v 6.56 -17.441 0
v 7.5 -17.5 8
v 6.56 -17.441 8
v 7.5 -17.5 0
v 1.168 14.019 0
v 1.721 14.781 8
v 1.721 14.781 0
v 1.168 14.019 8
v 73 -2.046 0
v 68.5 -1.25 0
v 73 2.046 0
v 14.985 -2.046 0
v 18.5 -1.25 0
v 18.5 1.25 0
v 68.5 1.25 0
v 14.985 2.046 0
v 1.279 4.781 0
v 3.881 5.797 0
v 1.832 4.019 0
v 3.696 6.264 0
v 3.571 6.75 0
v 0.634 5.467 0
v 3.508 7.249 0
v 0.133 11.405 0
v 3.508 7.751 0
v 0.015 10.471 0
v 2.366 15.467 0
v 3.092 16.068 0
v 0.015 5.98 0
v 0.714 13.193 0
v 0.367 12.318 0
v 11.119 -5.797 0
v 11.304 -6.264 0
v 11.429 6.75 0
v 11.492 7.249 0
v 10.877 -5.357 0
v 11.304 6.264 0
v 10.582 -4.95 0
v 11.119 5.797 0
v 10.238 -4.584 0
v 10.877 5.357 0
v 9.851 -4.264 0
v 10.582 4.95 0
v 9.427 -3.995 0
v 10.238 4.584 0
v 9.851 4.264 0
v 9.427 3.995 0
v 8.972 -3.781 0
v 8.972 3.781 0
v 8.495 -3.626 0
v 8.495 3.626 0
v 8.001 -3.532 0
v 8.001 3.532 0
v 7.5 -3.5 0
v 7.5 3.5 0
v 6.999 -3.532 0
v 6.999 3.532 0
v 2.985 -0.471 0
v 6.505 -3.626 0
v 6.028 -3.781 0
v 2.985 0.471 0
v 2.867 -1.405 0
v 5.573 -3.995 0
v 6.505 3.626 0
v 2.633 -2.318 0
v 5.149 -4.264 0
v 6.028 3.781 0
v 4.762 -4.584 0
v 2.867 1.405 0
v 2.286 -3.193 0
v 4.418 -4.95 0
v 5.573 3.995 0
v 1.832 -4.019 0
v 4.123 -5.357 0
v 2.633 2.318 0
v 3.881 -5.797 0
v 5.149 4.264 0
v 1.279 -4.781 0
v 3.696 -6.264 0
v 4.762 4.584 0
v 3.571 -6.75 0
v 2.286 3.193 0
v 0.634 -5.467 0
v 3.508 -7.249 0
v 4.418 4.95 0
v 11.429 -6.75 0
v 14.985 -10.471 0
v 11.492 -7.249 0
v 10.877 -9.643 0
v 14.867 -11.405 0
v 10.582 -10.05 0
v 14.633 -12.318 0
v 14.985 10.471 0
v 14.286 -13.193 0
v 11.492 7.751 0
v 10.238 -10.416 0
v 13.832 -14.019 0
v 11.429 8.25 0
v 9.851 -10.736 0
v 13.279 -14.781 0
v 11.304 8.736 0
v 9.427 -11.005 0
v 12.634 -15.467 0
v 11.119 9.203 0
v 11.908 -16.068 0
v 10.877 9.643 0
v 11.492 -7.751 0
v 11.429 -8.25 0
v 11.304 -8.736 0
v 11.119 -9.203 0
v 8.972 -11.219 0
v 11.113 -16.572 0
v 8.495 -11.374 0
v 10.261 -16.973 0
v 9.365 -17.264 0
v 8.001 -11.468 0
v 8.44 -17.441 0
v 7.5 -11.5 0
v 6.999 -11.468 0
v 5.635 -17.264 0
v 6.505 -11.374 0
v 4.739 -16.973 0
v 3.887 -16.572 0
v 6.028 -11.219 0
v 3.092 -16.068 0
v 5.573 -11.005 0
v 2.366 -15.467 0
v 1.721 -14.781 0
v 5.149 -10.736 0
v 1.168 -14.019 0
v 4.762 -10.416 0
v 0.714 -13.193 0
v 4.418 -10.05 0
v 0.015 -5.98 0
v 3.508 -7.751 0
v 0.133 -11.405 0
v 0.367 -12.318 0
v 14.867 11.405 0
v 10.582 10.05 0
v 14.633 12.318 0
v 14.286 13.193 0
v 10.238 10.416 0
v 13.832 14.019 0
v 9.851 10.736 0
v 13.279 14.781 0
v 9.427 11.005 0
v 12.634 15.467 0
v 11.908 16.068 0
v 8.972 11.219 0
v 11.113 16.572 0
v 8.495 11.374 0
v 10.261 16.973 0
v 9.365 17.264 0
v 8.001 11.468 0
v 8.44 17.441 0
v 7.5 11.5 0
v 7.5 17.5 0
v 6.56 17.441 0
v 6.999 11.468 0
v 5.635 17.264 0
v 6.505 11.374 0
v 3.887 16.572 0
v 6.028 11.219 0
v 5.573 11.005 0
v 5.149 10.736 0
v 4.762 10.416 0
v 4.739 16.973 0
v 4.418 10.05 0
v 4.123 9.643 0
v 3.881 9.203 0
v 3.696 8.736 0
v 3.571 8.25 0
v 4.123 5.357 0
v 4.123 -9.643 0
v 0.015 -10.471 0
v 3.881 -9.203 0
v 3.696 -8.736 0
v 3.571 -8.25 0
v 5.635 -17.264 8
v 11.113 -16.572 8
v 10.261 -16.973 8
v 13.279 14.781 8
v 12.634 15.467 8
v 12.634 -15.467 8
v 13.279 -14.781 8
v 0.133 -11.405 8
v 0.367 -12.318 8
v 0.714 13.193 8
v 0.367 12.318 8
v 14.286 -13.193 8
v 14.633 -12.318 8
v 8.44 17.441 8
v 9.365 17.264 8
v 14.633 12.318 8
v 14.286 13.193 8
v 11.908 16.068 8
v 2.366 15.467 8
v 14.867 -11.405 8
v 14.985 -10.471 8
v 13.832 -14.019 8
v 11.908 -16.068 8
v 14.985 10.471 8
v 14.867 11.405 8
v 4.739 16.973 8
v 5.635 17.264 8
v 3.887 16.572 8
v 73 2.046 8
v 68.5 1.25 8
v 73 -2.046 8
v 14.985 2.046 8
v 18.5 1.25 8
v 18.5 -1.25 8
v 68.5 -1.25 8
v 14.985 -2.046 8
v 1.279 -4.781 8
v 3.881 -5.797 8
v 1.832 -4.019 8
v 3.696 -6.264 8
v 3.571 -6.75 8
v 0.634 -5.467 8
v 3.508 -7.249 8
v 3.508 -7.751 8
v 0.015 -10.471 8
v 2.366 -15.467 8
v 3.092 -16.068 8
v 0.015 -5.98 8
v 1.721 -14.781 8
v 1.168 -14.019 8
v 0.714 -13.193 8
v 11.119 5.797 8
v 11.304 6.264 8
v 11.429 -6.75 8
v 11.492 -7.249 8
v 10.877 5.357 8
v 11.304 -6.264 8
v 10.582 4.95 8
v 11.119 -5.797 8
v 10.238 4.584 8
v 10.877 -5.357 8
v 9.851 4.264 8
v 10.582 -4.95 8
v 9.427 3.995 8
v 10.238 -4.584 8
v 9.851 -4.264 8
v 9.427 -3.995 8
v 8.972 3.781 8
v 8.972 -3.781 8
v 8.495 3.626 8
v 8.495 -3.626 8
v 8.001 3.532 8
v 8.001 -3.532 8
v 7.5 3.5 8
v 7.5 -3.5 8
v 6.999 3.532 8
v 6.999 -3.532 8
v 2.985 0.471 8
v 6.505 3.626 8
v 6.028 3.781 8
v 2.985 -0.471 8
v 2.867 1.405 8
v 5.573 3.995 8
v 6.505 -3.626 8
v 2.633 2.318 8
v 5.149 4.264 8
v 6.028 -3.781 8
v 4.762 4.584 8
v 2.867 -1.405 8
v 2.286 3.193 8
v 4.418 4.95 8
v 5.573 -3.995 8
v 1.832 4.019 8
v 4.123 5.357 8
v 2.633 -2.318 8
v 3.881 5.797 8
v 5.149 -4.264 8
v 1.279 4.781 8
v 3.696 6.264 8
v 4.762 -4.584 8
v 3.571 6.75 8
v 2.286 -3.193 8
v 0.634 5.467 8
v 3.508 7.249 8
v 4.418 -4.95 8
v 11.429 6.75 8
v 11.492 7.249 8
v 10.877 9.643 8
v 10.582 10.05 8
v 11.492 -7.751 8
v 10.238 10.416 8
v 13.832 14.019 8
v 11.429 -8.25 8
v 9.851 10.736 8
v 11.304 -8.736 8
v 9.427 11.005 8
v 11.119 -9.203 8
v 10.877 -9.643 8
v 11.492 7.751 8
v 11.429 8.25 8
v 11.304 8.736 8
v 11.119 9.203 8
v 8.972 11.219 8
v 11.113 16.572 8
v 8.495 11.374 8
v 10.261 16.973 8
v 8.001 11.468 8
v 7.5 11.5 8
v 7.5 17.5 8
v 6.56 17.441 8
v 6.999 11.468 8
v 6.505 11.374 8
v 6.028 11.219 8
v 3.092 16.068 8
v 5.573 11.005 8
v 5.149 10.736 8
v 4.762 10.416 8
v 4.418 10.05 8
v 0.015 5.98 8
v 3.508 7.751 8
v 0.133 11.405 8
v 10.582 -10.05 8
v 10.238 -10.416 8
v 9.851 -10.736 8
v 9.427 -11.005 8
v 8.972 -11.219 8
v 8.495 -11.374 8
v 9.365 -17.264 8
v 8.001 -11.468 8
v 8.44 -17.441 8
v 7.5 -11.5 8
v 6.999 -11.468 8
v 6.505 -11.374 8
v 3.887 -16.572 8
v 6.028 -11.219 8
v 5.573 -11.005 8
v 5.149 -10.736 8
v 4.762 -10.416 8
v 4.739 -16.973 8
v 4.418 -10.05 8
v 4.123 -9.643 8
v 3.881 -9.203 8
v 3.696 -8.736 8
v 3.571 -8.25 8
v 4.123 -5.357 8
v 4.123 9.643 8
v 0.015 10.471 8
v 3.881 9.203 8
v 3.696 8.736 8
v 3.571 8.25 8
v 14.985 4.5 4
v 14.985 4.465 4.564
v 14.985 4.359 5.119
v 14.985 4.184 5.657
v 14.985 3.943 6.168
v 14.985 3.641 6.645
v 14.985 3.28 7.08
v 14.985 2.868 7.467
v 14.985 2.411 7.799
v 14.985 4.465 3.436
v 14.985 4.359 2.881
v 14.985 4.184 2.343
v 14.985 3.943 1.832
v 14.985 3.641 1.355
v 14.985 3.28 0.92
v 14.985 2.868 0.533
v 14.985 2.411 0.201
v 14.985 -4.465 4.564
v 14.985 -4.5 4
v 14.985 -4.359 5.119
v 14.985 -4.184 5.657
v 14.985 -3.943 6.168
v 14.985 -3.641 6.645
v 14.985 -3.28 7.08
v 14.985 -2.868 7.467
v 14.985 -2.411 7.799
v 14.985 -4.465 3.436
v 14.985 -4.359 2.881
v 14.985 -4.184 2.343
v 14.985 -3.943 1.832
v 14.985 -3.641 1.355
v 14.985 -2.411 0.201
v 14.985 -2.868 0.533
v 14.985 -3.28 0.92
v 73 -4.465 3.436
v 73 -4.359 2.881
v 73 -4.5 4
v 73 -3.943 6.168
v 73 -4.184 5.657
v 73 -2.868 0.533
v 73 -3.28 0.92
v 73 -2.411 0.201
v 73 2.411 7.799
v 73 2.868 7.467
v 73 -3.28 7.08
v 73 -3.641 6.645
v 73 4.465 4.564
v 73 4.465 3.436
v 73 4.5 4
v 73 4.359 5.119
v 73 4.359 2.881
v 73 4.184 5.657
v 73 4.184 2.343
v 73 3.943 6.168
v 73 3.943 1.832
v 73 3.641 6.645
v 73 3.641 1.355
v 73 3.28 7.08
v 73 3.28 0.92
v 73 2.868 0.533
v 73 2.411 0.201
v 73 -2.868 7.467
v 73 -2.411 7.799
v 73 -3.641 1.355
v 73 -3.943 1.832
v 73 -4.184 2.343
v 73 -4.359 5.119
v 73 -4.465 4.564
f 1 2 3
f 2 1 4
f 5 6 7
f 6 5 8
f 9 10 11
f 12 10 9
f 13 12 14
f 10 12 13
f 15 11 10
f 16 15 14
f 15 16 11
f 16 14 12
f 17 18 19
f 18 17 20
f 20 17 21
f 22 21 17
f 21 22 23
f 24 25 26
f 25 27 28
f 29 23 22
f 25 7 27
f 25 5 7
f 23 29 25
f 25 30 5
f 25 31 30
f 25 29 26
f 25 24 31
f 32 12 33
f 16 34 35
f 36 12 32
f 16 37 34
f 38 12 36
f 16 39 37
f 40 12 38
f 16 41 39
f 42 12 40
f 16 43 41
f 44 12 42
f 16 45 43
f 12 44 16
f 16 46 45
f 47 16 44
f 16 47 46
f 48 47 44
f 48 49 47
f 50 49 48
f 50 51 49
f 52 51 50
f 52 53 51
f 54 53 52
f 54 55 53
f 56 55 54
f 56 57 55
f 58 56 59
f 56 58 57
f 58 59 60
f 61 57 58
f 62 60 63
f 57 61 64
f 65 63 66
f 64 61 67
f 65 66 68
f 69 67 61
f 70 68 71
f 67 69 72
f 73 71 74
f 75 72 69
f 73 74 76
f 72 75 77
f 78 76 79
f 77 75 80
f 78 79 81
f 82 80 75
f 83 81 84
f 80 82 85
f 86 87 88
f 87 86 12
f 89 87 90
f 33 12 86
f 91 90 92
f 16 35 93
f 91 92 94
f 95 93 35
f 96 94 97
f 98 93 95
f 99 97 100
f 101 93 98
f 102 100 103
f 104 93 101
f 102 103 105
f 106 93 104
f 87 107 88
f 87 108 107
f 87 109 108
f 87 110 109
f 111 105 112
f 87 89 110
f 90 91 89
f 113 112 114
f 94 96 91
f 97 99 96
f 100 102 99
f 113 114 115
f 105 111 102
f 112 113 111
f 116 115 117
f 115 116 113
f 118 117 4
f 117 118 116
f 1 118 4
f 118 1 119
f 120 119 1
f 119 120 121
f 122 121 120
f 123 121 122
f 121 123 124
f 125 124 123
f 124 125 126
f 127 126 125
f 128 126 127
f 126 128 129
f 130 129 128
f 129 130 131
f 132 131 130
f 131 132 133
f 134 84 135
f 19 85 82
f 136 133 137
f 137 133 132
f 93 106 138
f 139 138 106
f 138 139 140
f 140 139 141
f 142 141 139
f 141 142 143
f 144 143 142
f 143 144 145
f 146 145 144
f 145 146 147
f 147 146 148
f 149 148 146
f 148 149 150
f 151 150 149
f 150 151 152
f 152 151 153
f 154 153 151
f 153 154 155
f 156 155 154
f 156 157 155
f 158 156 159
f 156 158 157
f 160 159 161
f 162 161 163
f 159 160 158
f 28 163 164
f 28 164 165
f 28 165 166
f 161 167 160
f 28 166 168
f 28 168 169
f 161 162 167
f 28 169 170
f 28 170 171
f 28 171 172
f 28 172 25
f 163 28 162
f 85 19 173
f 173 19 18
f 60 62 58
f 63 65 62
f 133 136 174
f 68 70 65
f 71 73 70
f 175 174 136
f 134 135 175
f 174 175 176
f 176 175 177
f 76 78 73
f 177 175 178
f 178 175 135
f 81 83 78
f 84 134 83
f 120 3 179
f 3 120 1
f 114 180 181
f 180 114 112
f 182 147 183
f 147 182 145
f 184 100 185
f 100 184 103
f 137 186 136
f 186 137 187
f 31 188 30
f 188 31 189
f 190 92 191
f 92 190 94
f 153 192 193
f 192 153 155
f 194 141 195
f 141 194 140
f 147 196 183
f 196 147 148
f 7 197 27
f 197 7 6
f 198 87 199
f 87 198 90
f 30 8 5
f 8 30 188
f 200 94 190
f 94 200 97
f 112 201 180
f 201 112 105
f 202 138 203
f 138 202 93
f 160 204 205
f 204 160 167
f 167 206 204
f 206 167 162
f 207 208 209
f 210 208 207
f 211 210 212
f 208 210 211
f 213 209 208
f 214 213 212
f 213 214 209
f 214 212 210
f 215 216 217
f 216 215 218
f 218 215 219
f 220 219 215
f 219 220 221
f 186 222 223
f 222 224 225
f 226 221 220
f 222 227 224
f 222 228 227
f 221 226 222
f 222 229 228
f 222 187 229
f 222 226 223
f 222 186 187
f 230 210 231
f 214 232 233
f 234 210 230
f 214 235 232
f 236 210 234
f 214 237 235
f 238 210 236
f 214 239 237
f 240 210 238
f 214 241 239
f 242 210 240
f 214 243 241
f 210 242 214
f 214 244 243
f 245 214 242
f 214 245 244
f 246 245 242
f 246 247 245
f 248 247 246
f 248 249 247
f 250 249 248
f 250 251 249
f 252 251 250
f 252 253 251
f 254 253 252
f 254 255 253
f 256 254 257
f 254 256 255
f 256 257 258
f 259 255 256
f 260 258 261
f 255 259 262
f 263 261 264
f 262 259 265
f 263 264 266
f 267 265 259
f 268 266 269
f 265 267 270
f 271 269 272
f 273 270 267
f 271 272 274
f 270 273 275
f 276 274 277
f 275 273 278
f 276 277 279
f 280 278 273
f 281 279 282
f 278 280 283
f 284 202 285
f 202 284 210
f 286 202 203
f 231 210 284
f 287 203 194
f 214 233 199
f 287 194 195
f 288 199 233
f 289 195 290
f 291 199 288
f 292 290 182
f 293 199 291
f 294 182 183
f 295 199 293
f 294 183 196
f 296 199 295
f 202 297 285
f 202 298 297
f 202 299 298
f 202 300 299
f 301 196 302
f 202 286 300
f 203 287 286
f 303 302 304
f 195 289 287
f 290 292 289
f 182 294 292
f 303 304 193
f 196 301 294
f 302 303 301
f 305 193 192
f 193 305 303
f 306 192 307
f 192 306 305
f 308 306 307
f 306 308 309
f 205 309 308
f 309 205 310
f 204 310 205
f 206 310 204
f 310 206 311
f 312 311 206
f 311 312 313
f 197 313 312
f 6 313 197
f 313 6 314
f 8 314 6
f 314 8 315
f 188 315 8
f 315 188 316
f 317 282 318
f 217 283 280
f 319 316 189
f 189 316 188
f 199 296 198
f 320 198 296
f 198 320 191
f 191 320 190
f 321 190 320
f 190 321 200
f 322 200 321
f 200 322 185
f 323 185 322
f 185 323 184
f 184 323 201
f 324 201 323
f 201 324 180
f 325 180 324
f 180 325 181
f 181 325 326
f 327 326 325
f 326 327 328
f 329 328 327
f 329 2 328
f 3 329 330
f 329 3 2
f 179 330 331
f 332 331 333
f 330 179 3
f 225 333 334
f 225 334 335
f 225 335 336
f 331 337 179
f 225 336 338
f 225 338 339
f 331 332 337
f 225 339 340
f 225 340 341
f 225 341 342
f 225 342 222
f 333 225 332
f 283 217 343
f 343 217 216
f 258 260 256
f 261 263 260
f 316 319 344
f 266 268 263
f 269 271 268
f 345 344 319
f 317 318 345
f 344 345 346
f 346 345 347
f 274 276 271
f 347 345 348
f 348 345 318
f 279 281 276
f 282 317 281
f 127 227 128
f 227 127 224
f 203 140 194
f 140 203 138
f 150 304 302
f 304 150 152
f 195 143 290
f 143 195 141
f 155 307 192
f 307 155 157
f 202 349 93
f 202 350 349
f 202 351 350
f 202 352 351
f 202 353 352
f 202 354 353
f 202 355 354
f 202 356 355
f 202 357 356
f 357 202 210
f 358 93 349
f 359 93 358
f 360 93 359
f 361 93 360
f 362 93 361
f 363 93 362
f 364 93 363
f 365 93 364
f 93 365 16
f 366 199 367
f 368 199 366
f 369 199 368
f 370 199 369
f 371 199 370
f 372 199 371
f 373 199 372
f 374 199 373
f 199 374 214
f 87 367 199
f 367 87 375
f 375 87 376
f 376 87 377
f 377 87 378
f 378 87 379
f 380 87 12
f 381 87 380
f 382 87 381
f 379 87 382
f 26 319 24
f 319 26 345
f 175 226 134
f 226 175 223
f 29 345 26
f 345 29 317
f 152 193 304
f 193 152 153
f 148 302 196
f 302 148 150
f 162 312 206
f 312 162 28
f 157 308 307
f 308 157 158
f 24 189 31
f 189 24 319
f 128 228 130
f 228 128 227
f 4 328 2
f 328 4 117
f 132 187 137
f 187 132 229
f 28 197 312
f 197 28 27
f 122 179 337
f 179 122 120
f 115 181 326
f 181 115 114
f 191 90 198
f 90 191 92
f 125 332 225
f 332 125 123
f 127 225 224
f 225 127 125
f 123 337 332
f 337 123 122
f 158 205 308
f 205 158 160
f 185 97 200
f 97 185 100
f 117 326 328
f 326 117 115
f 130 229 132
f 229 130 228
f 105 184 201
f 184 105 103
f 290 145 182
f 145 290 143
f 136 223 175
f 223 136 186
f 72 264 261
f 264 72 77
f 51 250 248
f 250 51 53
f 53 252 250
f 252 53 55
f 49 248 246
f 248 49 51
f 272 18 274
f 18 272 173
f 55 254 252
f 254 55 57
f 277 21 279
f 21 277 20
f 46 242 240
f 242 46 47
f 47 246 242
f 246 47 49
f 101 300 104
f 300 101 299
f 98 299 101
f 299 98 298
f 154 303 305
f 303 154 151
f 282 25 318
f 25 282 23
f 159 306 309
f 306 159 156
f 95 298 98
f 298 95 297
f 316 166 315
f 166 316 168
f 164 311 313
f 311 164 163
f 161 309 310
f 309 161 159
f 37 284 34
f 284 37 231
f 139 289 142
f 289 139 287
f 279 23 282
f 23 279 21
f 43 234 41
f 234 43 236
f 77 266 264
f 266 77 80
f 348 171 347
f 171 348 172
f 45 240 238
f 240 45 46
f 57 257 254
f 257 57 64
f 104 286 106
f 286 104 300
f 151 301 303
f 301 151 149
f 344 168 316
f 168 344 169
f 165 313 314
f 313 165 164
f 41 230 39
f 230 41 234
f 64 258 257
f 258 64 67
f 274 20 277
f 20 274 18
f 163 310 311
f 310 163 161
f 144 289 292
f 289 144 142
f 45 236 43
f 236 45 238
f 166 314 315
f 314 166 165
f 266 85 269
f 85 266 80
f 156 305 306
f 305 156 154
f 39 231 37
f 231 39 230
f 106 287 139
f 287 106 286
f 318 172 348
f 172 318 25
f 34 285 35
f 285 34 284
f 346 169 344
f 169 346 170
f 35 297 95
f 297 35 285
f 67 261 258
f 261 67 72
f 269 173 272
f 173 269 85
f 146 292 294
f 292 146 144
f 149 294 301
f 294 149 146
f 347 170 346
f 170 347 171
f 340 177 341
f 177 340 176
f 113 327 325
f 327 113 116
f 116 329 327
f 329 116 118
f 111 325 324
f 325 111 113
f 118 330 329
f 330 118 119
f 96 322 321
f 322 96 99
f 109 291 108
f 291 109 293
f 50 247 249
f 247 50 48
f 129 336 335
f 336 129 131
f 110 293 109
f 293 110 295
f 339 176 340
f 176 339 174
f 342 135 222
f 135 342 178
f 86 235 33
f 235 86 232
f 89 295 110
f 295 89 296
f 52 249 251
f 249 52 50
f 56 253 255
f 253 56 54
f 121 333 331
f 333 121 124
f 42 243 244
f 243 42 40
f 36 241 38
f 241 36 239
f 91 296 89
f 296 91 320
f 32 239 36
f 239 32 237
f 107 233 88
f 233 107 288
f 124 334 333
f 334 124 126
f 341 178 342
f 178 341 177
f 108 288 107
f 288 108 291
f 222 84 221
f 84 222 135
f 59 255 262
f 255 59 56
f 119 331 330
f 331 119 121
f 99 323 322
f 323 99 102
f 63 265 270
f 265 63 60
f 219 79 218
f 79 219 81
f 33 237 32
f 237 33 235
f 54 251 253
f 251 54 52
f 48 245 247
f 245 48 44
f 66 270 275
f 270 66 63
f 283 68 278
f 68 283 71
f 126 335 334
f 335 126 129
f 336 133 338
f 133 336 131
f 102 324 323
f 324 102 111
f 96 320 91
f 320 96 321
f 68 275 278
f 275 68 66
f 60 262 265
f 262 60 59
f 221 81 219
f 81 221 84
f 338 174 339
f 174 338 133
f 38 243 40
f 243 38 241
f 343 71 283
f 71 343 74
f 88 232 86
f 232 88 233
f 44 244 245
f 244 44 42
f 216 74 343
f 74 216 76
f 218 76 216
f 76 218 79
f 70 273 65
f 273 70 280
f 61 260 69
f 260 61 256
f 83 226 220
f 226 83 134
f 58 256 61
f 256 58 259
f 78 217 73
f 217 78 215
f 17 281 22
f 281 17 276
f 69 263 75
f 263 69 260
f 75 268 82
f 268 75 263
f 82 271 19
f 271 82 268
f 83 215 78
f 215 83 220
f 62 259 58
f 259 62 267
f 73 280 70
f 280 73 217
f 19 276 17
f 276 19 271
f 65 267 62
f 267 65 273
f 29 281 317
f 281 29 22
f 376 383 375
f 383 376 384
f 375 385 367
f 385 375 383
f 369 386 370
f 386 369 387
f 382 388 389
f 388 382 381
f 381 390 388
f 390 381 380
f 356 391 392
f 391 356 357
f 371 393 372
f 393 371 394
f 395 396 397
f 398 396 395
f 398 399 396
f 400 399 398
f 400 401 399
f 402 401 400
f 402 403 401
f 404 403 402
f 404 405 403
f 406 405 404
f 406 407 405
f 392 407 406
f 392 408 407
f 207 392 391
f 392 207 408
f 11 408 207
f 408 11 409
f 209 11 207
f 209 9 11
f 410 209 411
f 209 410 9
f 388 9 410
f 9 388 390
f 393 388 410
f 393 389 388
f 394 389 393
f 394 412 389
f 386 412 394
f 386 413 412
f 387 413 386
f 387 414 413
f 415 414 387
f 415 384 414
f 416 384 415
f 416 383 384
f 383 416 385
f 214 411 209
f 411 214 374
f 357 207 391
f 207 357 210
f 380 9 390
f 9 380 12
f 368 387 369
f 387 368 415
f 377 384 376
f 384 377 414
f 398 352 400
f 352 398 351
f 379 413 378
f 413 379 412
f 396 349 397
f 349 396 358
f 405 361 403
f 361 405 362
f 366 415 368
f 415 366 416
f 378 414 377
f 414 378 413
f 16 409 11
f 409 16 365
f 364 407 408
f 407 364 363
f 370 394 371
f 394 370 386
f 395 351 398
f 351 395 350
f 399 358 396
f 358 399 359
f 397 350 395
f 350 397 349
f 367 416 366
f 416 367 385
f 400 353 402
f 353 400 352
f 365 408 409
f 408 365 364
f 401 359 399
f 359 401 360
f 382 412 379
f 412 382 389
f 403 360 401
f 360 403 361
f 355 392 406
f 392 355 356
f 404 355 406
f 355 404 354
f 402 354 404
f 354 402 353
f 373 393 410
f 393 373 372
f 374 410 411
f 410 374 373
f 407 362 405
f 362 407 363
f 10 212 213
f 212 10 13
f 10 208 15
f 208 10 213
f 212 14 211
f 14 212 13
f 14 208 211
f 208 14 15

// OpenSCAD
// [FL_INDEX: keywords="openscad, 3d_parametric, Tooth-paste_Paint_Tube_Key, csg_solid" | COT="Parametric OpenSCAD design from 3DCodeverse"]
// Title: Tooth-paste/Paint Tube Key

//////
// Tooth-paste/Paint Tube Key
//
// http://www.thingiverse.com/thing:21410
// By: Alan Yates <thingiverse@alanyates.com>
//////

// geometry
barrel_diameter = 9.0;
barrel_flats = 8.0;
slot_width = 2.5;
slot_length = 50.0;
key_width = 35.0;
key_height = 15.0;
hole_diameter = 8;

// tolerances
overlap = 1;
$fn = 50;

translate([0, 0, barrel_flats/2])
	rotate(-90, [0, 0, 1]) rotate(-90, [1, 0, 0])
		tube_key(barrel_diameter, barrel_flats, slot_width, slot_length, key_width, key_height, hole_diameter);

module tube_key(bd, bf, sw, sl, kw, kh, hd) {
	union() {
		translate([0, 0, kh/2])
			rotate(90, [1, 0, 0]) {
				difference() {
					hull() {
						translate([kw/2 - kh/2, 0, 0])
							cylinder(r = kh/2, h = bf, center = true);
						translate([- kw/2 + kh/2, 0, 0])
							cylinder(r = kh/2, h = bf, center = true);
					}
#					translate([-kh/2, 0, -bf/2-overlap])
						cylinder(r = hd/2, h = bf + 2*overlap);
#					translate([kh/2, 0, -bf/2-overlap])
						cylinder(r = hd/2, h = bf + 2*overlap);
#					translate([0, -4*kh/5, -bf/2-overlap])
						cylinder(r = kh/2, h = bf + 2*overlap);
				}
			}
		translate([0, 0, kh - overlap])
			difference() {
				cylinder(r = bd/2, h = sl + bd);
		
#				translate([-sw/2, -bd/2 - overlap, bd/2])
					cube([sw, bd + 2*overlap, sl]);
#				translate([-bd/2 - overlap, bf/2, -overlap])
					cube([bd + 2*overlap, bd/2, sl + bd + 2*overlap]);
#				translate([-bd/2 - overlap, -bf/2 - bd/2, -overlap])
					cube([bd + 2*overlap, bd/2, sl + bd + 2*overlap]);
			}
	}
}
